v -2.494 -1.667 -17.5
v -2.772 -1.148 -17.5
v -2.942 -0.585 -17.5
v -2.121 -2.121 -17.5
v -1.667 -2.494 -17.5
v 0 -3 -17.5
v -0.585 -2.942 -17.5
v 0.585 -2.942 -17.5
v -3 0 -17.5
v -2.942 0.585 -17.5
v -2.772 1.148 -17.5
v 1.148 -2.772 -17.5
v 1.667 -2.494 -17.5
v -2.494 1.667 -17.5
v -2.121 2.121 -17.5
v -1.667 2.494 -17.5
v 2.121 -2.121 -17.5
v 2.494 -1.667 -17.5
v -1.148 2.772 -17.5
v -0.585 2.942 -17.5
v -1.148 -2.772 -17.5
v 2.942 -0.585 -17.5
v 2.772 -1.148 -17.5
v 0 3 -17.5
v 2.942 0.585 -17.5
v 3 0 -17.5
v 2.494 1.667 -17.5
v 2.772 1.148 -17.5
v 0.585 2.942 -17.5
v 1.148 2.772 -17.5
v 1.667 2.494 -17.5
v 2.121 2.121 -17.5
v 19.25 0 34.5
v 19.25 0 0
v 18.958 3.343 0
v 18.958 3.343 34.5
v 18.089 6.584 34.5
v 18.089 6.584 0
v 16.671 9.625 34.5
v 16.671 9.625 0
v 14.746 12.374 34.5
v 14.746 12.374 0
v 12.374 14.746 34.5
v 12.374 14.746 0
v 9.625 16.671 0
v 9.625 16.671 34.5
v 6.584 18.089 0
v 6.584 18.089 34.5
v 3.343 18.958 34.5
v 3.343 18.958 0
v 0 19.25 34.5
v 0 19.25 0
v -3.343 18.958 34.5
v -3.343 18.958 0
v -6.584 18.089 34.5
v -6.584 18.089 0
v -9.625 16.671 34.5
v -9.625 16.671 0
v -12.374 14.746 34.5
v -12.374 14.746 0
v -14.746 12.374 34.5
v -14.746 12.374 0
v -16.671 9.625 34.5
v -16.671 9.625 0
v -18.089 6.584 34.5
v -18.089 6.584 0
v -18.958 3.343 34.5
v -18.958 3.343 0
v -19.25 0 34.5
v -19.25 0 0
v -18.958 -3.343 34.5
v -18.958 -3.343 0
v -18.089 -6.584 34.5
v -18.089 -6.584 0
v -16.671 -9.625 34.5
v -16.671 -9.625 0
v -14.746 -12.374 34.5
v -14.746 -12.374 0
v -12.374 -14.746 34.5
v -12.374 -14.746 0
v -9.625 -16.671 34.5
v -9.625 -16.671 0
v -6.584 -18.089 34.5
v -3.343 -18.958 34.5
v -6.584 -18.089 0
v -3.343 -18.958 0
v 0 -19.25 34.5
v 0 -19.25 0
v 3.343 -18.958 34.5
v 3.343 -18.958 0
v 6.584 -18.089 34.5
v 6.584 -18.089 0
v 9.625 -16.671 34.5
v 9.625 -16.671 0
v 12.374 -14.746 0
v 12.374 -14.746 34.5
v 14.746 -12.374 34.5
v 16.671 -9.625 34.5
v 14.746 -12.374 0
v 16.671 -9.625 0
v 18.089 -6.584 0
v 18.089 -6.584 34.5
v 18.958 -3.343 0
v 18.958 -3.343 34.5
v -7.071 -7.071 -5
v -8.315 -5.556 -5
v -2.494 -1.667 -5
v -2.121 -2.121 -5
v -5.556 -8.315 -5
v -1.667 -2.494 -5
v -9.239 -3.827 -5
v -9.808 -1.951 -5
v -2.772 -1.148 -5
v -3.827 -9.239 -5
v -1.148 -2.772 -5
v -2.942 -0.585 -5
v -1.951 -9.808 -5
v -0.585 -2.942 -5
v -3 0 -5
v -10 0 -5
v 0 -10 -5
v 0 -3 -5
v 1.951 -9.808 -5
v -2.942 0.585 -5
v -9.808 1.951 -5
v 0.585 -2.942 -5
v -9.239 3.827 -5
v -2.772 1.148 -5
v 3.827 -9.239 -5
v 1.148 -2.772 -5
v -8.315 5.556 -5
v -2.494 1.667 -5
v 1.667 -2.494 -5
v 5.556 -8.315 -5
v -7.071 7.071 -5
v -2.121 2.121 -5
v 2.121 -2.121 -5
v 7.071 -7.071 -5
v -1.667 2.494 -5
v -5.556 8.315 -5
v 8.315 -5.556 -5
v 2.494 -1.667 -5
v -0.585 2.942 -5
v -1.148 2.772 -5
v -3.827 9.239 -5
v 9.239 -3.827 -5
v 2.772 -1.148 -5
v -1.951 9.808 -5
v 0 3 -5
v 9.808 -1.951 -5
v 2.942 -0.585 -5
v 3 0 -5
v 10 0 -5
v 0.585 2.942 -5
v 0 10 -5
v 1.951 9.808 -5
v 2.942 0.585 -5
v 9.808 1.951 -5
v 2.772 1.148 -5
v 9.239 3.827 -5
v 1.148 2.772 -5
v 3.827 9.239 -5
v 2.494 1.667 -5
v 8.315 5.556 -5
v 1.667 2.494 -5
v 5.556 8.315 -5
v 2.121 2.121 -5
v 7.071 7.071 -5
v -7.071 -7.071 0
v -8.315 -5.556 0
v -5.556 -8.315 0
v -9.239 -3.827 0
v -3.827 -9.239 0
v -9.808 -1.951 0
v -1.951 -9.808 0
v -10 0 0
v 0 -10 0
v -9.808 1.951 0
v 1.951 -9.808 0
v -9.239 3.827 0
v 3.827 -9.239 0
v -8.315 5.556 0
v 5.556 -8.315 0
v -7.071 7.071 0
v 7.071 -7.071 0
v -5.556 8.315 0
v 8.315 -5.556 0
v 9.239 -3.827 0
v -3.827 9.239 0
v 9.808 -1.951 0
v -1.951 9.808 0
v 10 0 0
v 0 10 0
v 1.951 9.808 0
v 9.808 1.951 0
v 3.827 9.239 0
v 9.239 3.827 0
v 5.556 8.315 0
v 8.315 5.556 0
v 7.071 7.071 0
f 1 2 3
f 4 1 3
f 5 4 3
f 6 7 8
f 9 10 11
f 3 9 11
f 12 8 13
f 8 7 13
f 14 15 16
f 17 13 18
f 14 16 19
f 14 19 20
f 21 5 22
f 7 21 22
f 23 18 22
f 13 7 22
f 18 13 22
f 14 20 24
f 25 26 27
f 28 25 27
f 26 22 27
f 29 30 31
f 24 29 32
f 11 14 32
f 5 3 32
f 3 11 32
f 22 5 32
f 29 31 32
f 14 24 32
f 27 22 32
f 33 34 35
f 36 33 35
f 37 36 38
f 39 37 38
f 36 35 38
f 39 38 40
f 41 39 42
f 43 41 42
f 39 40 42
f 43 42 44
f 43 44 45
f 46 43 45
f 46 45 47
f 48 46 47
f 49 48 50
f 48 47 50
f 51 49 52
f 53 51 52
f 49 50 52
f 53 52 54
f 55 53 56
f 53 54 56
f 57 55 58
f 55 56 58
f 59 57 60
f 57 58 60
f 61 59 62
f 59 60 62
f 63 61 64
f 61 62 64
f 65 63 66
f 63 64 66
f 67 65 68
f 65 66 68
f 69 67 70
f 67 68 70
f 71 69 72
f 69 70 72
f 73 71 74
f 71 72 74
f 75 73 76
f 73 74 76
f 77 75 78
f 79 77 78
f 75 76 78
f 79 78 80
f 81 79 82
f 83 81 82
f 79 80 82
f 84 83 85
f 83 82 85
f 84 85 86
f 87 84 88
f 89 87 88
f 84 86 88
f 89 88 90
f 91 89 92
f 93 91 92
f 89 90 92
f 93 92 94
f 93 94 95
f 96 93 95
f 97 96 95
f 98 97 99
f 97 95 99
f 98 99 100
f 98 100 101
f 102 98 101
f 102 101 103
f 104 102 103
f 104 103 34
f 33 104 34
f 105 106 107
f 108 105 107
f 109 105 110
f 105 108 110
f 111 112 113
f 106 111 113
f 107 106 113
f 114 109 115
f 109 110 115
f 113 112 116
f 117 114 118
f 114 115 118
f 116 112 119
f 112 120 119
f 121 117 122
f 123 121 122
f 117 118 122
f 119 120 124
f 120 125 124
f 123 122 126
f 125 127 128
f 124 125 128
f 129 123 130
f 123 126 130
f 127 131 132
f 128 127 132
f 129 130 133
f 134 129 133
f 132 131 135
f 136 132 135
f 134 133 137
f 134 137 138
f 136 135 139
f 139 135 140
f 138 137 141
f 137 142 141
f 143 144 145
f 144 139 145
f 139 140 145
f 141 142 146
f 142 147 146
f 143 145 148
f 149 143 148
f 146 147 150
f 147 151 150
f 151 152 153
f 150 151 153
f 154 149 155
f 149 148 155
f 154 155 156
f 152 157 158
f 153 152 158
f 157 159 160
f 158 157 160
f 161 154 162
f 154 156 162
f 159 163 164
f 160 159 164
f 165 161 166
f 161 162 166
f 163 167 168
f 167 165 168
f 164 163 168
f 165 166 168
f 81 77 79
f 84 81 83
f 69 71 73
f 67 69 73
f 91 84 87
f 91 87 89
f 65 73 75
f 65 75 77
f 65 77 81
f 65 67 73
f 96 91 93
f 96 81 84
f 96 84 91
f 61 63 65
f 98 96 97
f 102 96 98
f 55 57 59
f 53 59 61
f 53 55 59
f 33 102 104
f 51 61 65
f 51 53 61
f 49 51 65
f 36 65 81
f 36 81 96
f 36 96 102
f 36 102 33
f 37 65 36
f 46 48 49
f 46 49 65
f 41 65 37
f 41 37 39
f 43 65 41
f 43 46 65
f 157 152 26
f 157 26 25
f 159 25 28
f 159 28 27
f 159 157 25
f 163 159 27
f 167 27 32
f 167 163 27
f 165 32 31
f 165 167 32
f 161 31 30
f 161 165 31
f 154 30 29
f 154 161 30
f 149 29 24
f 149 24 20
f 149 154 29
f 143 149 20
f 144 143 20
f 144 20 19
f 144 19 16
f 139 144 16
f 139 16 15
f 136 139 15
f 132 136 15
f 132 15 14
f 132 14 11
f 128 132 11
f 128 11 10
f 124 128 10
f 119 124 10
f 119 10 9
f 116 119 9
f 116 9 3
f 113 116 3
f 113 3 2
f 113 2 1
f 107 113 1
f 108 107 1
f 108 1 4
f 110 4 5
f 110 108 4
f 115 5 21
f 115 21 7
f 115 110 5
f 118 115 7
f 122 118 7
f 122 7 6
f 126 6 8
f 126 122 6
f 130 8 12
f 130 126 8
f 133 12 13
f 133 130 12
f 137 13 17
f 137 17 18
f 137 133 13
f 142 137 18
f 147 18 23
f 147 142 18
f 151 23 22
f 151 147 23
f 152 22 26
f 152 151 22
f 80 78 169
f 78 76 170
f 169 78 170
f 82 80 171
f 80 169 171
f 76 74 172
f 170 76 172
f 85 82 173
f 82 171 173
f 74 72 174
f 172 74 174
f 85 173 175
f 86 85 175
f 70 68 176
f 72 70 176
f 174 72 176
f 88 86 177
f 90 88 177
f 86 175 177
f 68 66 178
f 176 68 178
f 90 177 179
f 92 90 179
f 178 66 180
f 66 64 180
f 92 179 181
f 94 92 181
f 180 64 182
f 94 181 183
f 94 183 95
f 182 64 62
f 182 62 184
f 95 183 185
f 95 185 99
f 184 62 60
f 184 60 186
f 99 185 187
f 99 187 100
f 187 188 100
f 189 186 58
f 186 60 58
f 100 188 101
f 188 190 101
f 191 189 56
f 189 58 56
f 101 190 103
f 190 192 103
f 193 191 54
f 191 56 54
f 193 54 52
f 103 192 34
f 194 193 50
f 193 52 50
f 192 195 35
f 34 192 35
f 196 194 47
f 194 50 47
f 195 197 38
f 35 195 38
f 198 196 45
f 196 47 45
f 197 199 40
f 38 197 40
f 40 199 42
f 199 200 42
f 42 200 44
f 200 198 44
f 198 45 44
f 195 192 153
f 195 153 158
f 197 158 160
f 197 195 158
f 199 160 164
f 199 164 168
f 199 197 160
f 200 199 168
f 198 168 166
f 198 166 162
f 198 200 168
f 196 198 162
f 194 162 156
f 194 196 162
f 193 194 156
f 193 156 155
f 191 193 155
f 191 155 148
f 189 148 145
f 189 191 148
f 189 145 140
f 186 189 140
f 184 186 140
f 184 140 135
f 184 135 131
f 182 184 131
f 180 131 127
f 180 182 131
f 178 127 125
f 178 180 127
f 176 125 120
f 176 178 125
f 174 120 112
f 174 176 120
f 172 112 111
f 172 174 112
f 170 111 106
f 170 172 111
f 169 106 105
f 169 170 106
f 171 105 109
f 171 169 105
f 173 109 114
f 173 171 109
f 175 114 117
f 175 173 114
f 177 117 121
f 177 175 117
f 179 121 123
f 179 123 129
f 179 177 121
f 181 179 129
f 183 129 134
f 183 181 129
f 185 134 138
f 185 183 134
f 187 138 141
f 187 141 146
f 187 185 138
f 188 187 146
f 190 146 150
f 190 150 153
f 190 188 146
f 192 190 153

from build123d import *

# Parameters (mm, degrees)
SKETCH1_R           = 19.25
BOSS_EXTRUDE1_DEPTH = 34.5
SKETCH1_3_R         = 10
SKETCH1_3_R_2       = 3
BOSS_EXTRUDE2_DEPTH = 5
SKETCH1_4_R         = 3
BOSS_EXTRUDE3_DEPTH = 17.5


with BuildPart() as part:
    # Sketch1 → Boss-Extrude1 (new body)
    with BuildSketch(Plane.XY):
        Circle(SKETCH1_R)
    extrude(amount=BOSS_EXTRUDE1_DEPTH)

    # Sketch1<3> → Boss-Extrude2 (add)
    with BuildSketch(Plane.XY):
        Circle(SKETCH1_3_R)
        Circle(SKETCH1_3_R_2, mode=Mode.SUBTRACT)
    extrude(amount=-BOSS_EXTRUDE2_DEPTH)

    # Sketch1<4> → Boss-Extrude3 (add)
    with BuildSketch(Plane.XY):
        Circle(SKETCH1_4_R)
    extrude(amount=-BOSS_EXTRUDE3_DEPTH)


solid = part.part
